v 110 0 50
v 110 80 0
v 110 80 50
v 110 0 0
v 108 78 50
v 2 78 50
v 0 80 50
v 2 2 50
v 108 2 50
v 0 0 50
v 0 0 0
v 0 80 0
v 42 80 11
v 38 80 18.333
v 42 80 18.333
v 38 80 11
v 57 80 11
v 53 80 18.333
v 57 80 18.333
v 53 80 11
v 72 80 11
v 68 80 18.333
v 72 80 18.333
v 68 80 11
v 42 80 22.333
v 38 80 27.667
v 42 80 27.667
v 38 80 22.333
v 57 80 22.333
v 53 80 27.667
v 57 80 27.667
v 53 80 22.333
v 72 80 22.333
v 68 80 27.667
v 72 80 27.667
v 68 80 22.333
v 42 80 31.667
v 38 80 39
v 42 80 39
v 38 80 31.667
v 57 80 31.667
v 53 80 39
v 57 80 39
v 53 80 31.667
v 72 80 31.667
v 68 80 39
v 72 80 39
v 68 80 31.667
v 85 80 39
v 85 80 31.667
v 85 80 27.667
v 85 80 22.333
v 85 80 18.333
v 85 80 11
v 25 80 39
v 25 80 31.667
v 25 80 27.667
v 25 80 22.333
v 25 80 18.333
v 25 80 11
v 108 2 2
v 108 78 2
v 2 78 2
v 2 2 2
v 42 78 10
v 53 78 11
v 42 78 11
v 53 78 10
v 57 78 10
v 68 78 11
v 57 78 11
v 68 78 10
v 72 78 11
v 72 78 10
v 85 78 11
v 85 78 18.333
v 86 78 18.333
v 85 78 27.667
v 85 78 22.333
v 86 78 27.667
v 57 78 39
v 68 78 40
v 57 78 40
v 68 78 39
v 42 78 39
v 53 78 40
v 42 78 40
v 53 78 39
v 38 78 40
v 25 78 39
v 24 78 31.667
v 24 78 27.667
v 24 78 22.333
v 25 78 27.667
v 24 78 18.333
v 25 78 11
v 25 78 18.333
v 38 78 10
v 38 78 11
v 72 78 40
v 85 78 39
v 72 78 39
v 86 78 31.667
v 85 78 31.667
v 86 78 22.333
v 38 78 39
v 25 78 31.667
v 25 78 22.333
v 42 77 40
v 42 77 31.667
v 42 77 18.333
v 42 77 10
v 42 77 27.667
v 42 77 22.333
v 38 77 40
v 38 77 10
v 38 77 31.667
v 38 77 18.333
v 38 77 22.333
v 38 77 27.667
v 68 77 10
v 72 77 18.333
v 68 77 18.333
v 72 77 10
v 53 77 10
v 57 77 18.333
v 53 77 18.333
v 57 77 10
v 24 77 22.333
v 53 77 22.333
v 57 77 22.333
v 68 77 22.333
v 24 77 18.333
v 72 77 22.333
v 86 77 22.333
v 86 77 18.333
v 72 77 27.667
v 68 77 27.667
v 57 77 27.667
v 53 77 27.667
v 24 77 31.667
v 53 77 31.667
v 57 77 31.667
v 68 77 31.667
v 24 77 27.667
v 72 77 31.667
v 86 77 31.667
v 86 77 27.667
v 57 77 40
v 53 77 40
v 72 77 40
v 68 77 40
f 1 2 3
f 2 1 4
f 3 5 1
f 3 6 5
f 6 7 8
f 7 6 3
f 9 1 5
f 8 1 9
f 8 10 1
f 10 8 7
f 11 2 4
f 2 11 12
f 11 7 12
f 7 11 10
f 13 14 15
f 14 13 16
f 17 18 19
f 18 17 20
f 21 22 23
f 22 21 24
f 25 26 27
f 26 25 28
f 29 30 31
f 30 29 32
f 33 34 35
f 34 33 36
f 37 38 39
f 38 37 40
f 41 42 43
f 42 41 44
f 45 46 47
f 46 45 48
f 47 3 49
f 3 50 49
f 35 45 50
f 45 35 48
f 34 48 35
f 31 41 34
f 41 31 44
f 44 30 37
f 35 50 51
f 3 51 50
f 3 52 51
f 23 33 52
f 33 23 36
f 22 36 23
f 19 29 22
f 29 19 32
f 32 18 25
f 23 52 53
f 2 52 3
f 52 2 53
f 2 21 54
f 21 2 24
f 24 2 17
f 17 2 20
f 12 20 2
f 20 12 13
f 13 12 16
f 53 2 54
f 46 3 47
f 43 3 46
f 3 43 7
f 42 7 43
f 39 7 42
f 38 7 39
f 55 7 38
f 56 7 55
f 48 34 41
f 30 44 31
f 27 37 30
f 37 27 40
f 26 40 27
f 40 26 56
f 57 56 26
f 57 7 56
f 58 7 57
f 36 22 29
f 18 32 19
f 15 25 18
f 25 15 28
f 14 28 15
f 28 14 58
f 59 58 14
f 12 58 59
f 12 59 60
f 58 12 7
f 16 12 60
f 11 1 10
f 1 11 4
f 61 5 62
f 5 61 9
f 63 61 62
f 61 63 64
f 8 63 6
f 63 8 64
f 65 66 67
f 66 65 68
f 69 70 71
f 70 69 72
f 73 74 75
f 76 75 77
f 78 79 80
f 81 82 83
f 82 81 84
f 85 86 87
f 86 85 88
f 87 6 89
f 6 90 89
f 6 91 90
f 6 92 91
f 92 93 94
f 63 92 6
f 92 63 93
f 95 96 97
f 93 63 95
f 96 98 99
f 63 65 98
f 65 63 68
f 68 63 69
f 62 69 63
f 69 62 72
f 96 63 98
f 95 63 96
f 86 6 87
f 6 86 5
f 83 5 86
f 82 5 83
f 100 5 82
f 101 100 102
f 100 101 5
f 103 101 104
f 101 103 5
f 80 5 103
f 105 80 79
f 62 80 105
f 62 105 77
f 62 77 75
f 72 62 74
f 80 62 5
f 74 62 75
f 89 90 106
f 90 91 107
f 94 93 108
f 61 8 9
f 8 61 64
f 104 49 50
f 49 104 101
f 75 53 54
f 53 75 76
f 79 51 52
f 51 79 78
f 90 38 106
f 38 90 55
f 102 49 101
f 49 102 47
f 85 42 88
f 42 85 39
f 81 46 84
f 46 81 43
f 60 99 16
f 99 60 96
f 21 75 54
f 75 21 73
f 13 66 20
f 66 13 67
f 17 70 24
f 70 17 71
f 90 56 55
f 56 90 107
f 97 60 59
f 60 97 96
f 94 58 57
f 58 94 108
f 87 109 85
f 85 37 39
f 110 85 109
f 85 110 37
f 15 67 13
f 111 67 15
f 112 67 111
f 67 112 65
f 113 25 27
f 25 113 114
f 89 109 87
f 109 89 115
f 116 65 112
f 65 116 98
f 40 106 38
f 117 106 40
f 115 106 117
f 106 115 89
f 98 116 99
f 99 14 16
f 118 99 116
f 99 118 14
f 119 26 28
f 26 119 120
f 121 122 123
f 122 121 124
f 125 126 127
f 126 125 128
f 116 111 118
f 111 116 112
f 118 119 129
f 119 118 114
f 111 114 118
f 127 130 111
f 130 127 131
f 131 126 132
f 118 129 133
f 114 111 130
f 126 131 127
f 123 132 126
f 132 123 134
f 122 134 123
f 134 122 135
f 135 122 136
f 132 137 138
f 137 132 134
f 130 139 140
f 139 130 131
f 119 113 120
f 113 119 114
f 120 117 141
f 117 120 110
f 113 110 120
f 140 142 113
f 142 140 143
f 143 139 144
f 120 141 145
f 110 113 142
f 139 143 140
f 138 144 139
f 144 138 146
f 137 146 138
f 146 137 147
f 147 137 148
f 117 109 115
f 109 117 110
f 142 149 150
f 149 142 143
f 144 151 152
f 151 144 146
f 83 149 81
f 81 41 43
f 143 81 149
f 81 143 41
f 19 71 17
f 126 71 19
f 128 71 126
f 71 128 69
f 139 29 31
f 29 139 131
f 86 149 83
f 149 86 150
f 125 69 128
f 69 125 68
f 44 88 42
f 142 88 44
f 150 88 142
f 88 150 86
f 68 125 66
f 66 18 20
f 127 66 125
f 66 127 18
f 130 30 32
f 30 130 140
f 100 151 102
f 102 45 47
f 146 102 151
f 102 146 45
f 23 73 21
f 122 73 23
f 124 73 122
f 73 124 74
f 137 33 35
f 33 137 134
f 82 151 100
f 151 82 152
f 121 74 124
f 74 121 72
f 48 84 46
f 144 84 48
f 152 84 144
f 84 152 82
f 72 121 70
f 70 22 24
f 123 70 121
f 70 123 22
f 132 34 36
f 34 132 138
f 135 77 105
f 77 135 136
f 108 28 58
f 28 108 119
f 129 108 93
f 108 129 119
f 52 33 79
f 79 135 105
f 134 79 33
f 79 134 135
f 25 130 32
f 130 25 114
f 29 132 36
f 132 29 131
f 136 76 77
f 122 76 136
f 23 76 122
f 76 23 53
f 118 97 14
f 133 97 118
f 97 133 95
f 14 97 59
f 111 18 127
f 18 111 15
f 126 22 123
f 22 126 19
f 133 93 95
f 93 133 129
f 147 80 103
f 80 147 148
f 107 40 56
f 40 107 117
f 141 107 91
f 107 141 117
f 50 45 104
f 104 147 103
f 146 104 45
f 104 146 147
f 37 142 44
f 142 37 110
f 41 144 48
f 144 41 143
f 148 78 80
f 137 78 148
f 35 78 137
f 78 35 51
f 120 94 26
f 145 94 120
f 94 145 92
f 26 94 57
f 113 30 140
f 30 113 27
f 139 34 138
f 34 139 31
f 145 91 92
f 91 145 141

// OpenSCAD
$fn = 32;

// ----------------------------------------------------------------------
// Vent box: crossgrid enclosure
// ----------------------------------------------------------------------

// --- parameters (mm) ---
box_l = 110;              // box length, X
box_w = 80;               // box width, Y
box_h = 50;               // box height, Z
wall_t = 2;               // shell wall thickness
win_l = 60;               // vent window width, X
win_h = 28;               // vent window height, Z
bar_w = 4;                // grid bar width
n_v = 3;                  // vertical bar count
n_h = 2;                  // horizontal bar count

win_z0 = (box_h - win_h) / 2;  // window lower edge Z
v_step = win_l / (n_v + 1);  // vertical bar step
h_step = win_h / (n_h + 1);  // horizontal bar step

difference() {
  union() {
    difference() {
      cube([box_l, box_w, box_h]);
  translate([wall_t, wall_t, wall_t])
    cube([box_l - 2 * wall_t, box_w - 2 * wall_t, box_h]);
  translate([(box_l - win_l) / 2, box_w - wall_t - 1, win_z0])
    cube([win_l, wall_t + 2, win_h]);
    }
    for (i = [1 : n_v])
      translate([(box_l - win_l) / 2 + i * v_step - bar_w / 2,
                 box_w - wall_t - 1, win_z0 - 1])
        cube([bar_w, wall_t + 1, win_h + 2]);
    for (i = [1 : n_h])
      translate([(box_l - win_l) / 2 - 1, box_w - wall_t - 1,
                 win_z0 + i * h_step - bar_w / 2])
        cube([win_l + 2, wall_t + 1, bar_w]);
  }
}
